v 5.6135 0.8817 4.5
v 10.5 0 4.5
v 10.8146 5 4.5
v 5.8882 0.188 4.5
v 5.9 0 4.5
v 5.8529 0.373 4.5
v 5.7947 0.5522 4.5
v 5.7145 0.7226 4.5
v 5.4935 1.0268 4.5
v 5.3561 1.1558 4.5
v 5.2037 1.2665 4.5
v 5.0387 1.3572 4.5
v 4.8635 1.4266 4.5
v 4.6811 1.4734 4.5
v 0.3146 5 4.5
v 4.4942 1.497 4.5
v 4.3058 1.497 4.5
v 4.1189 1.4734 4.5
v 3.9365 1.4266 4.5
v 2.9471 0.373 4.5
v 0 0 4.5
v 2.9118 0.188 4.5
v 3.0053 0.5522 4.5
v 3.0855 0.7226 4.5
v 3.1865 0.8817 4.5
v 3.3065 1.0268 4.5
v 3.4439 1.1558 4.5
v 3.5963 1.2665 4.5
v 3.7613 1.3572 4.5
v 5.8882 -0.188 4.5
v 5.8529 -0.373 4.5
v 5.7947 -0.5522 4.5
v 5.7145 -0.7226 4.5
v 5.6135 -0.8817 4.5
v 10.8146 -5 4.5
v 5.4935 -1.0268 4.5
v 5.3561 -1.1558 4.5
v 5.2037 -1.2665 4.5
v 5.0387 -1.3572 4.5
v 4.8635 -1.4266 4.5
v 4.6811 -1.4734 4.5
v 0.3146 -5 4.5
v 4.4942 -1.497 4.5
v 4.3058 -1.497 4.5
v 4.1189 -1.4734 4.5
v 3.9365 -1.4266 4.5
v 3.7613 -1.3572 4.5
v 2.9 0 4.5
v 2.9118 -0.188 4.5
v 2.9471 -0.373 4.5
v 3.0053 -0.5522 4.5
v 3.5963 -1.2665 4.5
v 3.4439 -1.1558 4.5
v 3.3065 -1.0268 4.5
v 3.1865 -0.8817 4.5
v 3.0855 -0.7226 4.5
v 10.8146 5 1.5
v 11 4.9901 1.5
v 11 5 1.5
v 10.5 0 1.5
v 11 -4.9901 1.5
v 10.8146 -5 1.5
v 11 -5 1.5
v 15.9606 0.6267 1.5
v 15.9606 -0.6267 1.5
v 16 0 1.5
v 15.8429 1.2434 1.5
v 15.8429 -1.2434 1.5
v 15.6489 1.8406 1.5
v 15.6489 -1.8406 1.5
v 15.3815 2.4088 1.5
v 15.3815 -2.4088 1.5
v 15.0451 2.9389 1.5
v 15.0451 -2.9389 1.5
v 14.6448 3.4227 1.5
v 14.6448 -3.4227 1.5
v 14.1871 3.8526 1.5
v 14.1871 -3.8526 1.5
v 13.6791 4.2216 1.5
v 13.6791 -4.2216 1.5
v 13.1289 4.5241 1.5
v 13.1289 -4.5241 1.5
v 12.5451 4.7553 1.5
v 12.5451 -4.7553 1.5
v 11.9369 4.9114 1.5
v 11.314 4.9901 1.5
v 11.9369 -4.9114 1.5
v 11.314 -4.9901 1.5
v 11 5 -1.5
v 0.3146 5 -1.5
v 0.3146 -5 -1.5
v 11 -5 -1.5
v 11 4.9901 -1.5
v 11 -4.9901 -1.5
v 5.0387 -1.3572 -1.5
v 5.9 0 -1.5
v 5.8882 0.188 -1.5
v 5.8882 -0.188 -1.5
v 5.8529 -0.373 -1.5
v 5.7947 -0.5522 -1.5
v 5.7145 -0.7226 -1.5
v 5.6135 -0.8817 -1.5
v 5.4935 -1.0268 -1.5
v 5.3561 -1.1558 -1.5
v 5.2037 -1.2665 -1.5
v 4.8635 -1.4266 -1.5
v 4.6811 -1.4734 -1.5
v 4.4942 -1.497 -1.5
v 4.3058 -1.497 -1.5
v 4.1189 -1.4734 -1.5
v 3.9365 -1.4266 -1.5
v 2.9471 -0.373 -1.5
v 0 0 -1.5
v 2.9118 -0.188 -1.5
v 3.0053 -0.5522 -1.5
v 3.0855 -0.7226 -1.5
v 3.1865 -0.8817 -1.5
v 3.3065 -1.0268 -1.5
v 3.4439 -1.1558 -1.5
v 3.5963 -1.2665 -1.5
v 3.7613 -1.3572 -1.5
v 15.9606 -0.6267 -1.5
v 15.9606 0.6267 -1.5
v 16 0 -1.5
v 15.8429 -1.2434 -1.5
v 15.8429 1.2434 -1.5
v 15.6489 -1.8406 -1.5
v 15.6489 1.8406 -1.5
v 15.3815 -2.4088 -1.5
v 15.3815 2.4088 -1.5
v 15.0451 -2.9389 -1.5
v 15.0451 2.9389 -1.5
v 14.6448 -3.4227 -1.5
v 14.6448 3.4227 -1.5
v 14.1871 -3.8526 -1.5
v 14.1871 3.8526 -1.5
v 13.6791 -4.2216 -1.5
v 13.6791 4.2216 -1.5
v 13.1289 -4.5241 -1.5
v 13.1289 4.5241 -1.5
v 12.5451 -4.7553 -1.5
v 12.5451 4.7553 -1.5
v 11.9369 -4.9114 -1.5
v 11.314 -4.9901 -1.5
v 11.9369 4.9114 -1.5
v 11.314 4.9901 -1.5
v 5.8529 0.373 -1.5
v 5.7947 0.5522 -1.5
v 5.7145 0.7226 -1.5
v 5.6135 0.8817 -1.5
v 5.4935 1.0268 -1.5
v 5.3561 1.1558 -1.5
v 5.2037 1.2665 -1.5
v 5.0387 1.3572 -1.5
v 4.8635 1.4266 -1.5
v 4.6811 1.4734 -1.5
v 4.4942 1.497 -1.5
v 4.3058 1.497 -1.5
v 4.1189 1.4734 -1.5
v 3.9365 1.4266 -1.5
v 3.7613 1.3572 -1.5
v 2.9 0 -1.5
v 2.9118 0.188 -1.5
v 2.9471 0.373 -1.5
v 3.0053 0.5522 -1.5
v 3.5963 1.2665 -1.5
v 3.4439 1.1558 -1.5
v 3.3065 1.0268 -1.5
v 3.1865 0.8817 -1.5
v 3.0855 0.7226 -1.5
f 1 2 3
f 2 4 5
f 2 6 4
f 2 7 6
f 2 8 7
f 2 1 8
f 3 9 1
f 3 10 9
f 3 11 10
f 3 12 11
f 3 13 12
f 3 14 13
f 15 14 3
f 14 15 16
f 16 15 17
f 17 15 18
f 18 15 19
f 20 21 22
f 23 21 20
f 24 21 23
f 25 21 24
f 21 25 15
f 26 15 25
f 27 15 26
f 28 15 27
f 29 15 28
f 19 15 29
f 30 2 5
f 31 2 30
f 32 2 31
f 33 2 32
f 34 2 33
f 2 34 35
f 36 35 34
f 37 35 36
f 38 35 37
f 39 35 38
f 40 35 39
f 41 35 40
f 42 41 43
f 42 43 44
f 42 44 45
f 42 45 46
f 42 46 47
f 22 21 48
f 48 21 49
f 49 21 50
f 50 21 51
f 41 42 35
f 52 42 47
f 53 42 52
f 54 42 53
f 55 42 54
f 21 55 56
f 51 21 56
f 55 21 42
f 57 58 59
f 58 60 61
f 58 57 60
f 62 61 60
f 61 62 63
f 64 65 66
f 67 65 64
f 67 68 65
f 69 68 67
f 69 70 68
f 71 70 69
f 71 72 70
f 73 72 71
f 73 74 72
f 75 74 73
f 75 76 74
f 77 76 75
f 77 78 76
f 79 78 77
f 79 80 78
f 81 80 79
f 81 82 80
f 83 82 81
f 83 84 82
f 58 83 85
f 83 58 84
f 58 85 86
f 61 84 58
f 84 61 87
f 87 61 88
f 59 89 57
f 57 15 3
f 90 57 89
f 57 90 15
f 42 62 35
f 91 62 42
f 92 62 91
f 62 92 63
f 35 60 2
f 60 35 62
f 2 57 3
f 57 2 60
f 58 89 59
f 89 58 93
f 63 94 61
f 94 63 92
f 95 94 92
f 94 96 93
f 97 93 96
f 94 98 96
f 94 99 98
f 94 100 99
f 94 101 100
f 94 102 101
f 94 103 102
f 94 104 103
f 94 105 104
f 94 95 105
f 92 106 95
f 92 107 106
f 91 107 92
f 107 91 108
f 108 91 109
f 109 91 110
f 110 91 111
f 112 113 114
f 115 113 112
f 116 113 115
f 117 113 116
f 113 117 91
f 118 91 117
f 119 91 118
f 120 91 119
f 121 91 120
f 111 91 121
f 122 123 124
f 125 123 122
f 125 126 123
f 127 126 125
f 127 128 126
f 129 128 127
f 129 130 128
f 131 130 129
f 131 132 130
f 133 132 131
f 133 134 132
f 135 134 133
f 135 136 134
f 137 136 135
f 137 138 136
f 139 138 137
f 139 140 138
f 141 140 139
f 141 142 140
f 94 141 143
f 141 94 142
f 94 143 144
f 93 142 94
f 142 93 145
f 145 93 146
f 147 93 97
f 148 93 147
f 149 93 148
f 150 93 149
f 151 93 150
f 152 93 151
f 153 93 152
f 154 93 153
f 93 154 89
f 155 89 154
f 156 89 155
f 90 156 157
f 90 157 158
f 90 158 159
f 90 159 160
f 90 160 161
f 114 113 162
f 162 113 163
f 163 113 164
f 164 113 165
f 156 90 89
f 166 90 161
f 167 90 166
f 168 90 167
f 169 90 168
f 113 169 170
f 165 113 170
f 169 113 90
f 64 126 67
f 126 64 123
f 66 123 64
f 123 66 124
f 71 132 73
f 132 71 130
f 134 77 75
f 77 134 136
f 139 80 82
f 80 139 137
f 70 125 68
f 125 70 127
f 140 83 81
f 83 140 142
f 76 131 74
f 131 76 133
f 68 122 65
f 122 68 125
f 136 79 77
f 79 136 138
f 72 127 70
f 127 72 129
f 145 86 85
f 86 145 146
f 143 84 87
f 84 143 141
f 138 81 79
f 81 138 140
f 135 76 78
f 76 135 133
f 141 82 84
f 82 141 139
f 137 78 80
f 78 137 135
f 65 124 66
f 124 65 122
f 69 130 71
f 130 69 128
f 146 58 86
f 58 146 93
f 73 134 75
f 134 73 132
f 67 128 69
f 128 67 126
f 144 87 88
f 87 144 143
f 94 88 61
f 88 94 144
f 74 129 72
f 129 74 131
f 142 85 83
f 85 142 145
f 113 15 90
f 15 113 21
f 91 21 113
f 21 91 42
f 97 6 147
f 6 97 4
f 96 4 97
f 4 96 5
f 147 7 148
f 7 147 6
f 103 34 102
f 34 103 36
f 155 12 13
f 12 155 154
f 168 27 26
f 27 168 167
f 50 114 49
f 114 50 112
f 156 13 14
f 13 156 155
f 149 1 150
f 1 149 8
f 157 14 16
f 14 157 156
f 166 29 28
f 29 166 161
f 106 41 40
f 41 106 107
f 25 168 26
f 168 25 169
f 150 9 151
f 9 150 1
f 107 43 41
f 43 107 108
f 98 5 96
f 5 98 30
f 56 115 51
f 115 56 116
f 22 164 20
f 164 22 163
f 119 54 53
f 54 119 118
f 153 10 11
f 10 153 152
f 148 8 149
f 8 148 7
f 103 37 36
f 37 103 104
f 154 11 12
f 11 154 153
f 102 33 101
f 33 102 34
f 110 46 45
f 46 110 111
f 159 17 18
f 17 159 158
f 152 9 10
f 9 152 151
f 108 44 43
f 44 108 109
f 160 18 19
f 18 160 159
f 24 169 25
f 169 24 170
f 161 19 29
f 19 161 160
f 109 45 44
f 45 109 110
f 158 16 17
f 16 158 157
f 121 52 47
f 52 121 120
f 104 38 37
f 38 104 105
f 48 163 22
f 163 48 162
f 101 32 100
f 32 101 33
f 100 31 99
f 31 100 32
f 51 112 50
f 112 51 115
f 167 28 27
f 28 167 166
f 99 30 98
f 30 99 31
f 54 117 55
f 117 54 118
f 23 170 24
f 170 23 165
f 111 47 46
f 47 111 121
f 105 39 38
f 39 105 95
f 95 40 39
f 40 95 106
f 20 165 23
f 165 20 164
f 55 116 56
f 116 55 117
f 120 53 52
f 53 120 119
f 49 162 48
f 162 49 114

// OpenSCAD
//  He3D K200 Heated Bed Clamps for securing
//  Glass Plate

$fn = 50;
HB_DIAMETER = 220;
GP_DIAMETER = 199;
GP_HEIGHT = 3;
BOLT_DIAMETER = 3;
CLAMP_WIDTH = 10;
LOWER_DISTANCE = 11;

difference() {
	intersection() {
		union() {
			// Lower Layer
			difference() {
				translate([LOWER_DISTANCE / 2, 0, GP_HEIGHT]) 
					cube([LOWER_DISTANCE, 
						  CLAMP_WIDTH,
						  GP_HEIGHT], 
						  center = true);
				// Glass Plate curve
				translate([HB_DIAMETER / 2, 0, 0]) 
					cylinder(r = GP_DIAMETER / 2, 
							 h = GP_HEIGHT * 2.5);
			}
			
			// Upper Layer
			union() {
				translate([LOWER_DISTANCE / 2, 0, 0]) 
					cube([LOWER_DISTANCE, 
						  CLAMP_WIDTH,
						  GP_HEIGHT], 
						  center = true);
				
				translate([LOWER_DISTANCE, 0, 0]) 
					cylinder(r = CLAMP_WIDTH / 2,
							 h = GP_HEIGHT, 
							 center = true);
			}
		}
	
		// Heated Bed curve
		translate([HB_DIAMETER / 2, 0, -GP_HEIGHT]) 
		cylinder(r = HB_DIAMETER /2, 
				 h = GP_HEIGHT * 3);
	}
	// Bolt Hole
	translate([LOWER_DISTANCE * 0.4, 0, -GP_HEIGHT]) 
	cylinder(r = BOLT_DIAMETER / 2,
			 h = GP_HEIGHT * 3);
}
